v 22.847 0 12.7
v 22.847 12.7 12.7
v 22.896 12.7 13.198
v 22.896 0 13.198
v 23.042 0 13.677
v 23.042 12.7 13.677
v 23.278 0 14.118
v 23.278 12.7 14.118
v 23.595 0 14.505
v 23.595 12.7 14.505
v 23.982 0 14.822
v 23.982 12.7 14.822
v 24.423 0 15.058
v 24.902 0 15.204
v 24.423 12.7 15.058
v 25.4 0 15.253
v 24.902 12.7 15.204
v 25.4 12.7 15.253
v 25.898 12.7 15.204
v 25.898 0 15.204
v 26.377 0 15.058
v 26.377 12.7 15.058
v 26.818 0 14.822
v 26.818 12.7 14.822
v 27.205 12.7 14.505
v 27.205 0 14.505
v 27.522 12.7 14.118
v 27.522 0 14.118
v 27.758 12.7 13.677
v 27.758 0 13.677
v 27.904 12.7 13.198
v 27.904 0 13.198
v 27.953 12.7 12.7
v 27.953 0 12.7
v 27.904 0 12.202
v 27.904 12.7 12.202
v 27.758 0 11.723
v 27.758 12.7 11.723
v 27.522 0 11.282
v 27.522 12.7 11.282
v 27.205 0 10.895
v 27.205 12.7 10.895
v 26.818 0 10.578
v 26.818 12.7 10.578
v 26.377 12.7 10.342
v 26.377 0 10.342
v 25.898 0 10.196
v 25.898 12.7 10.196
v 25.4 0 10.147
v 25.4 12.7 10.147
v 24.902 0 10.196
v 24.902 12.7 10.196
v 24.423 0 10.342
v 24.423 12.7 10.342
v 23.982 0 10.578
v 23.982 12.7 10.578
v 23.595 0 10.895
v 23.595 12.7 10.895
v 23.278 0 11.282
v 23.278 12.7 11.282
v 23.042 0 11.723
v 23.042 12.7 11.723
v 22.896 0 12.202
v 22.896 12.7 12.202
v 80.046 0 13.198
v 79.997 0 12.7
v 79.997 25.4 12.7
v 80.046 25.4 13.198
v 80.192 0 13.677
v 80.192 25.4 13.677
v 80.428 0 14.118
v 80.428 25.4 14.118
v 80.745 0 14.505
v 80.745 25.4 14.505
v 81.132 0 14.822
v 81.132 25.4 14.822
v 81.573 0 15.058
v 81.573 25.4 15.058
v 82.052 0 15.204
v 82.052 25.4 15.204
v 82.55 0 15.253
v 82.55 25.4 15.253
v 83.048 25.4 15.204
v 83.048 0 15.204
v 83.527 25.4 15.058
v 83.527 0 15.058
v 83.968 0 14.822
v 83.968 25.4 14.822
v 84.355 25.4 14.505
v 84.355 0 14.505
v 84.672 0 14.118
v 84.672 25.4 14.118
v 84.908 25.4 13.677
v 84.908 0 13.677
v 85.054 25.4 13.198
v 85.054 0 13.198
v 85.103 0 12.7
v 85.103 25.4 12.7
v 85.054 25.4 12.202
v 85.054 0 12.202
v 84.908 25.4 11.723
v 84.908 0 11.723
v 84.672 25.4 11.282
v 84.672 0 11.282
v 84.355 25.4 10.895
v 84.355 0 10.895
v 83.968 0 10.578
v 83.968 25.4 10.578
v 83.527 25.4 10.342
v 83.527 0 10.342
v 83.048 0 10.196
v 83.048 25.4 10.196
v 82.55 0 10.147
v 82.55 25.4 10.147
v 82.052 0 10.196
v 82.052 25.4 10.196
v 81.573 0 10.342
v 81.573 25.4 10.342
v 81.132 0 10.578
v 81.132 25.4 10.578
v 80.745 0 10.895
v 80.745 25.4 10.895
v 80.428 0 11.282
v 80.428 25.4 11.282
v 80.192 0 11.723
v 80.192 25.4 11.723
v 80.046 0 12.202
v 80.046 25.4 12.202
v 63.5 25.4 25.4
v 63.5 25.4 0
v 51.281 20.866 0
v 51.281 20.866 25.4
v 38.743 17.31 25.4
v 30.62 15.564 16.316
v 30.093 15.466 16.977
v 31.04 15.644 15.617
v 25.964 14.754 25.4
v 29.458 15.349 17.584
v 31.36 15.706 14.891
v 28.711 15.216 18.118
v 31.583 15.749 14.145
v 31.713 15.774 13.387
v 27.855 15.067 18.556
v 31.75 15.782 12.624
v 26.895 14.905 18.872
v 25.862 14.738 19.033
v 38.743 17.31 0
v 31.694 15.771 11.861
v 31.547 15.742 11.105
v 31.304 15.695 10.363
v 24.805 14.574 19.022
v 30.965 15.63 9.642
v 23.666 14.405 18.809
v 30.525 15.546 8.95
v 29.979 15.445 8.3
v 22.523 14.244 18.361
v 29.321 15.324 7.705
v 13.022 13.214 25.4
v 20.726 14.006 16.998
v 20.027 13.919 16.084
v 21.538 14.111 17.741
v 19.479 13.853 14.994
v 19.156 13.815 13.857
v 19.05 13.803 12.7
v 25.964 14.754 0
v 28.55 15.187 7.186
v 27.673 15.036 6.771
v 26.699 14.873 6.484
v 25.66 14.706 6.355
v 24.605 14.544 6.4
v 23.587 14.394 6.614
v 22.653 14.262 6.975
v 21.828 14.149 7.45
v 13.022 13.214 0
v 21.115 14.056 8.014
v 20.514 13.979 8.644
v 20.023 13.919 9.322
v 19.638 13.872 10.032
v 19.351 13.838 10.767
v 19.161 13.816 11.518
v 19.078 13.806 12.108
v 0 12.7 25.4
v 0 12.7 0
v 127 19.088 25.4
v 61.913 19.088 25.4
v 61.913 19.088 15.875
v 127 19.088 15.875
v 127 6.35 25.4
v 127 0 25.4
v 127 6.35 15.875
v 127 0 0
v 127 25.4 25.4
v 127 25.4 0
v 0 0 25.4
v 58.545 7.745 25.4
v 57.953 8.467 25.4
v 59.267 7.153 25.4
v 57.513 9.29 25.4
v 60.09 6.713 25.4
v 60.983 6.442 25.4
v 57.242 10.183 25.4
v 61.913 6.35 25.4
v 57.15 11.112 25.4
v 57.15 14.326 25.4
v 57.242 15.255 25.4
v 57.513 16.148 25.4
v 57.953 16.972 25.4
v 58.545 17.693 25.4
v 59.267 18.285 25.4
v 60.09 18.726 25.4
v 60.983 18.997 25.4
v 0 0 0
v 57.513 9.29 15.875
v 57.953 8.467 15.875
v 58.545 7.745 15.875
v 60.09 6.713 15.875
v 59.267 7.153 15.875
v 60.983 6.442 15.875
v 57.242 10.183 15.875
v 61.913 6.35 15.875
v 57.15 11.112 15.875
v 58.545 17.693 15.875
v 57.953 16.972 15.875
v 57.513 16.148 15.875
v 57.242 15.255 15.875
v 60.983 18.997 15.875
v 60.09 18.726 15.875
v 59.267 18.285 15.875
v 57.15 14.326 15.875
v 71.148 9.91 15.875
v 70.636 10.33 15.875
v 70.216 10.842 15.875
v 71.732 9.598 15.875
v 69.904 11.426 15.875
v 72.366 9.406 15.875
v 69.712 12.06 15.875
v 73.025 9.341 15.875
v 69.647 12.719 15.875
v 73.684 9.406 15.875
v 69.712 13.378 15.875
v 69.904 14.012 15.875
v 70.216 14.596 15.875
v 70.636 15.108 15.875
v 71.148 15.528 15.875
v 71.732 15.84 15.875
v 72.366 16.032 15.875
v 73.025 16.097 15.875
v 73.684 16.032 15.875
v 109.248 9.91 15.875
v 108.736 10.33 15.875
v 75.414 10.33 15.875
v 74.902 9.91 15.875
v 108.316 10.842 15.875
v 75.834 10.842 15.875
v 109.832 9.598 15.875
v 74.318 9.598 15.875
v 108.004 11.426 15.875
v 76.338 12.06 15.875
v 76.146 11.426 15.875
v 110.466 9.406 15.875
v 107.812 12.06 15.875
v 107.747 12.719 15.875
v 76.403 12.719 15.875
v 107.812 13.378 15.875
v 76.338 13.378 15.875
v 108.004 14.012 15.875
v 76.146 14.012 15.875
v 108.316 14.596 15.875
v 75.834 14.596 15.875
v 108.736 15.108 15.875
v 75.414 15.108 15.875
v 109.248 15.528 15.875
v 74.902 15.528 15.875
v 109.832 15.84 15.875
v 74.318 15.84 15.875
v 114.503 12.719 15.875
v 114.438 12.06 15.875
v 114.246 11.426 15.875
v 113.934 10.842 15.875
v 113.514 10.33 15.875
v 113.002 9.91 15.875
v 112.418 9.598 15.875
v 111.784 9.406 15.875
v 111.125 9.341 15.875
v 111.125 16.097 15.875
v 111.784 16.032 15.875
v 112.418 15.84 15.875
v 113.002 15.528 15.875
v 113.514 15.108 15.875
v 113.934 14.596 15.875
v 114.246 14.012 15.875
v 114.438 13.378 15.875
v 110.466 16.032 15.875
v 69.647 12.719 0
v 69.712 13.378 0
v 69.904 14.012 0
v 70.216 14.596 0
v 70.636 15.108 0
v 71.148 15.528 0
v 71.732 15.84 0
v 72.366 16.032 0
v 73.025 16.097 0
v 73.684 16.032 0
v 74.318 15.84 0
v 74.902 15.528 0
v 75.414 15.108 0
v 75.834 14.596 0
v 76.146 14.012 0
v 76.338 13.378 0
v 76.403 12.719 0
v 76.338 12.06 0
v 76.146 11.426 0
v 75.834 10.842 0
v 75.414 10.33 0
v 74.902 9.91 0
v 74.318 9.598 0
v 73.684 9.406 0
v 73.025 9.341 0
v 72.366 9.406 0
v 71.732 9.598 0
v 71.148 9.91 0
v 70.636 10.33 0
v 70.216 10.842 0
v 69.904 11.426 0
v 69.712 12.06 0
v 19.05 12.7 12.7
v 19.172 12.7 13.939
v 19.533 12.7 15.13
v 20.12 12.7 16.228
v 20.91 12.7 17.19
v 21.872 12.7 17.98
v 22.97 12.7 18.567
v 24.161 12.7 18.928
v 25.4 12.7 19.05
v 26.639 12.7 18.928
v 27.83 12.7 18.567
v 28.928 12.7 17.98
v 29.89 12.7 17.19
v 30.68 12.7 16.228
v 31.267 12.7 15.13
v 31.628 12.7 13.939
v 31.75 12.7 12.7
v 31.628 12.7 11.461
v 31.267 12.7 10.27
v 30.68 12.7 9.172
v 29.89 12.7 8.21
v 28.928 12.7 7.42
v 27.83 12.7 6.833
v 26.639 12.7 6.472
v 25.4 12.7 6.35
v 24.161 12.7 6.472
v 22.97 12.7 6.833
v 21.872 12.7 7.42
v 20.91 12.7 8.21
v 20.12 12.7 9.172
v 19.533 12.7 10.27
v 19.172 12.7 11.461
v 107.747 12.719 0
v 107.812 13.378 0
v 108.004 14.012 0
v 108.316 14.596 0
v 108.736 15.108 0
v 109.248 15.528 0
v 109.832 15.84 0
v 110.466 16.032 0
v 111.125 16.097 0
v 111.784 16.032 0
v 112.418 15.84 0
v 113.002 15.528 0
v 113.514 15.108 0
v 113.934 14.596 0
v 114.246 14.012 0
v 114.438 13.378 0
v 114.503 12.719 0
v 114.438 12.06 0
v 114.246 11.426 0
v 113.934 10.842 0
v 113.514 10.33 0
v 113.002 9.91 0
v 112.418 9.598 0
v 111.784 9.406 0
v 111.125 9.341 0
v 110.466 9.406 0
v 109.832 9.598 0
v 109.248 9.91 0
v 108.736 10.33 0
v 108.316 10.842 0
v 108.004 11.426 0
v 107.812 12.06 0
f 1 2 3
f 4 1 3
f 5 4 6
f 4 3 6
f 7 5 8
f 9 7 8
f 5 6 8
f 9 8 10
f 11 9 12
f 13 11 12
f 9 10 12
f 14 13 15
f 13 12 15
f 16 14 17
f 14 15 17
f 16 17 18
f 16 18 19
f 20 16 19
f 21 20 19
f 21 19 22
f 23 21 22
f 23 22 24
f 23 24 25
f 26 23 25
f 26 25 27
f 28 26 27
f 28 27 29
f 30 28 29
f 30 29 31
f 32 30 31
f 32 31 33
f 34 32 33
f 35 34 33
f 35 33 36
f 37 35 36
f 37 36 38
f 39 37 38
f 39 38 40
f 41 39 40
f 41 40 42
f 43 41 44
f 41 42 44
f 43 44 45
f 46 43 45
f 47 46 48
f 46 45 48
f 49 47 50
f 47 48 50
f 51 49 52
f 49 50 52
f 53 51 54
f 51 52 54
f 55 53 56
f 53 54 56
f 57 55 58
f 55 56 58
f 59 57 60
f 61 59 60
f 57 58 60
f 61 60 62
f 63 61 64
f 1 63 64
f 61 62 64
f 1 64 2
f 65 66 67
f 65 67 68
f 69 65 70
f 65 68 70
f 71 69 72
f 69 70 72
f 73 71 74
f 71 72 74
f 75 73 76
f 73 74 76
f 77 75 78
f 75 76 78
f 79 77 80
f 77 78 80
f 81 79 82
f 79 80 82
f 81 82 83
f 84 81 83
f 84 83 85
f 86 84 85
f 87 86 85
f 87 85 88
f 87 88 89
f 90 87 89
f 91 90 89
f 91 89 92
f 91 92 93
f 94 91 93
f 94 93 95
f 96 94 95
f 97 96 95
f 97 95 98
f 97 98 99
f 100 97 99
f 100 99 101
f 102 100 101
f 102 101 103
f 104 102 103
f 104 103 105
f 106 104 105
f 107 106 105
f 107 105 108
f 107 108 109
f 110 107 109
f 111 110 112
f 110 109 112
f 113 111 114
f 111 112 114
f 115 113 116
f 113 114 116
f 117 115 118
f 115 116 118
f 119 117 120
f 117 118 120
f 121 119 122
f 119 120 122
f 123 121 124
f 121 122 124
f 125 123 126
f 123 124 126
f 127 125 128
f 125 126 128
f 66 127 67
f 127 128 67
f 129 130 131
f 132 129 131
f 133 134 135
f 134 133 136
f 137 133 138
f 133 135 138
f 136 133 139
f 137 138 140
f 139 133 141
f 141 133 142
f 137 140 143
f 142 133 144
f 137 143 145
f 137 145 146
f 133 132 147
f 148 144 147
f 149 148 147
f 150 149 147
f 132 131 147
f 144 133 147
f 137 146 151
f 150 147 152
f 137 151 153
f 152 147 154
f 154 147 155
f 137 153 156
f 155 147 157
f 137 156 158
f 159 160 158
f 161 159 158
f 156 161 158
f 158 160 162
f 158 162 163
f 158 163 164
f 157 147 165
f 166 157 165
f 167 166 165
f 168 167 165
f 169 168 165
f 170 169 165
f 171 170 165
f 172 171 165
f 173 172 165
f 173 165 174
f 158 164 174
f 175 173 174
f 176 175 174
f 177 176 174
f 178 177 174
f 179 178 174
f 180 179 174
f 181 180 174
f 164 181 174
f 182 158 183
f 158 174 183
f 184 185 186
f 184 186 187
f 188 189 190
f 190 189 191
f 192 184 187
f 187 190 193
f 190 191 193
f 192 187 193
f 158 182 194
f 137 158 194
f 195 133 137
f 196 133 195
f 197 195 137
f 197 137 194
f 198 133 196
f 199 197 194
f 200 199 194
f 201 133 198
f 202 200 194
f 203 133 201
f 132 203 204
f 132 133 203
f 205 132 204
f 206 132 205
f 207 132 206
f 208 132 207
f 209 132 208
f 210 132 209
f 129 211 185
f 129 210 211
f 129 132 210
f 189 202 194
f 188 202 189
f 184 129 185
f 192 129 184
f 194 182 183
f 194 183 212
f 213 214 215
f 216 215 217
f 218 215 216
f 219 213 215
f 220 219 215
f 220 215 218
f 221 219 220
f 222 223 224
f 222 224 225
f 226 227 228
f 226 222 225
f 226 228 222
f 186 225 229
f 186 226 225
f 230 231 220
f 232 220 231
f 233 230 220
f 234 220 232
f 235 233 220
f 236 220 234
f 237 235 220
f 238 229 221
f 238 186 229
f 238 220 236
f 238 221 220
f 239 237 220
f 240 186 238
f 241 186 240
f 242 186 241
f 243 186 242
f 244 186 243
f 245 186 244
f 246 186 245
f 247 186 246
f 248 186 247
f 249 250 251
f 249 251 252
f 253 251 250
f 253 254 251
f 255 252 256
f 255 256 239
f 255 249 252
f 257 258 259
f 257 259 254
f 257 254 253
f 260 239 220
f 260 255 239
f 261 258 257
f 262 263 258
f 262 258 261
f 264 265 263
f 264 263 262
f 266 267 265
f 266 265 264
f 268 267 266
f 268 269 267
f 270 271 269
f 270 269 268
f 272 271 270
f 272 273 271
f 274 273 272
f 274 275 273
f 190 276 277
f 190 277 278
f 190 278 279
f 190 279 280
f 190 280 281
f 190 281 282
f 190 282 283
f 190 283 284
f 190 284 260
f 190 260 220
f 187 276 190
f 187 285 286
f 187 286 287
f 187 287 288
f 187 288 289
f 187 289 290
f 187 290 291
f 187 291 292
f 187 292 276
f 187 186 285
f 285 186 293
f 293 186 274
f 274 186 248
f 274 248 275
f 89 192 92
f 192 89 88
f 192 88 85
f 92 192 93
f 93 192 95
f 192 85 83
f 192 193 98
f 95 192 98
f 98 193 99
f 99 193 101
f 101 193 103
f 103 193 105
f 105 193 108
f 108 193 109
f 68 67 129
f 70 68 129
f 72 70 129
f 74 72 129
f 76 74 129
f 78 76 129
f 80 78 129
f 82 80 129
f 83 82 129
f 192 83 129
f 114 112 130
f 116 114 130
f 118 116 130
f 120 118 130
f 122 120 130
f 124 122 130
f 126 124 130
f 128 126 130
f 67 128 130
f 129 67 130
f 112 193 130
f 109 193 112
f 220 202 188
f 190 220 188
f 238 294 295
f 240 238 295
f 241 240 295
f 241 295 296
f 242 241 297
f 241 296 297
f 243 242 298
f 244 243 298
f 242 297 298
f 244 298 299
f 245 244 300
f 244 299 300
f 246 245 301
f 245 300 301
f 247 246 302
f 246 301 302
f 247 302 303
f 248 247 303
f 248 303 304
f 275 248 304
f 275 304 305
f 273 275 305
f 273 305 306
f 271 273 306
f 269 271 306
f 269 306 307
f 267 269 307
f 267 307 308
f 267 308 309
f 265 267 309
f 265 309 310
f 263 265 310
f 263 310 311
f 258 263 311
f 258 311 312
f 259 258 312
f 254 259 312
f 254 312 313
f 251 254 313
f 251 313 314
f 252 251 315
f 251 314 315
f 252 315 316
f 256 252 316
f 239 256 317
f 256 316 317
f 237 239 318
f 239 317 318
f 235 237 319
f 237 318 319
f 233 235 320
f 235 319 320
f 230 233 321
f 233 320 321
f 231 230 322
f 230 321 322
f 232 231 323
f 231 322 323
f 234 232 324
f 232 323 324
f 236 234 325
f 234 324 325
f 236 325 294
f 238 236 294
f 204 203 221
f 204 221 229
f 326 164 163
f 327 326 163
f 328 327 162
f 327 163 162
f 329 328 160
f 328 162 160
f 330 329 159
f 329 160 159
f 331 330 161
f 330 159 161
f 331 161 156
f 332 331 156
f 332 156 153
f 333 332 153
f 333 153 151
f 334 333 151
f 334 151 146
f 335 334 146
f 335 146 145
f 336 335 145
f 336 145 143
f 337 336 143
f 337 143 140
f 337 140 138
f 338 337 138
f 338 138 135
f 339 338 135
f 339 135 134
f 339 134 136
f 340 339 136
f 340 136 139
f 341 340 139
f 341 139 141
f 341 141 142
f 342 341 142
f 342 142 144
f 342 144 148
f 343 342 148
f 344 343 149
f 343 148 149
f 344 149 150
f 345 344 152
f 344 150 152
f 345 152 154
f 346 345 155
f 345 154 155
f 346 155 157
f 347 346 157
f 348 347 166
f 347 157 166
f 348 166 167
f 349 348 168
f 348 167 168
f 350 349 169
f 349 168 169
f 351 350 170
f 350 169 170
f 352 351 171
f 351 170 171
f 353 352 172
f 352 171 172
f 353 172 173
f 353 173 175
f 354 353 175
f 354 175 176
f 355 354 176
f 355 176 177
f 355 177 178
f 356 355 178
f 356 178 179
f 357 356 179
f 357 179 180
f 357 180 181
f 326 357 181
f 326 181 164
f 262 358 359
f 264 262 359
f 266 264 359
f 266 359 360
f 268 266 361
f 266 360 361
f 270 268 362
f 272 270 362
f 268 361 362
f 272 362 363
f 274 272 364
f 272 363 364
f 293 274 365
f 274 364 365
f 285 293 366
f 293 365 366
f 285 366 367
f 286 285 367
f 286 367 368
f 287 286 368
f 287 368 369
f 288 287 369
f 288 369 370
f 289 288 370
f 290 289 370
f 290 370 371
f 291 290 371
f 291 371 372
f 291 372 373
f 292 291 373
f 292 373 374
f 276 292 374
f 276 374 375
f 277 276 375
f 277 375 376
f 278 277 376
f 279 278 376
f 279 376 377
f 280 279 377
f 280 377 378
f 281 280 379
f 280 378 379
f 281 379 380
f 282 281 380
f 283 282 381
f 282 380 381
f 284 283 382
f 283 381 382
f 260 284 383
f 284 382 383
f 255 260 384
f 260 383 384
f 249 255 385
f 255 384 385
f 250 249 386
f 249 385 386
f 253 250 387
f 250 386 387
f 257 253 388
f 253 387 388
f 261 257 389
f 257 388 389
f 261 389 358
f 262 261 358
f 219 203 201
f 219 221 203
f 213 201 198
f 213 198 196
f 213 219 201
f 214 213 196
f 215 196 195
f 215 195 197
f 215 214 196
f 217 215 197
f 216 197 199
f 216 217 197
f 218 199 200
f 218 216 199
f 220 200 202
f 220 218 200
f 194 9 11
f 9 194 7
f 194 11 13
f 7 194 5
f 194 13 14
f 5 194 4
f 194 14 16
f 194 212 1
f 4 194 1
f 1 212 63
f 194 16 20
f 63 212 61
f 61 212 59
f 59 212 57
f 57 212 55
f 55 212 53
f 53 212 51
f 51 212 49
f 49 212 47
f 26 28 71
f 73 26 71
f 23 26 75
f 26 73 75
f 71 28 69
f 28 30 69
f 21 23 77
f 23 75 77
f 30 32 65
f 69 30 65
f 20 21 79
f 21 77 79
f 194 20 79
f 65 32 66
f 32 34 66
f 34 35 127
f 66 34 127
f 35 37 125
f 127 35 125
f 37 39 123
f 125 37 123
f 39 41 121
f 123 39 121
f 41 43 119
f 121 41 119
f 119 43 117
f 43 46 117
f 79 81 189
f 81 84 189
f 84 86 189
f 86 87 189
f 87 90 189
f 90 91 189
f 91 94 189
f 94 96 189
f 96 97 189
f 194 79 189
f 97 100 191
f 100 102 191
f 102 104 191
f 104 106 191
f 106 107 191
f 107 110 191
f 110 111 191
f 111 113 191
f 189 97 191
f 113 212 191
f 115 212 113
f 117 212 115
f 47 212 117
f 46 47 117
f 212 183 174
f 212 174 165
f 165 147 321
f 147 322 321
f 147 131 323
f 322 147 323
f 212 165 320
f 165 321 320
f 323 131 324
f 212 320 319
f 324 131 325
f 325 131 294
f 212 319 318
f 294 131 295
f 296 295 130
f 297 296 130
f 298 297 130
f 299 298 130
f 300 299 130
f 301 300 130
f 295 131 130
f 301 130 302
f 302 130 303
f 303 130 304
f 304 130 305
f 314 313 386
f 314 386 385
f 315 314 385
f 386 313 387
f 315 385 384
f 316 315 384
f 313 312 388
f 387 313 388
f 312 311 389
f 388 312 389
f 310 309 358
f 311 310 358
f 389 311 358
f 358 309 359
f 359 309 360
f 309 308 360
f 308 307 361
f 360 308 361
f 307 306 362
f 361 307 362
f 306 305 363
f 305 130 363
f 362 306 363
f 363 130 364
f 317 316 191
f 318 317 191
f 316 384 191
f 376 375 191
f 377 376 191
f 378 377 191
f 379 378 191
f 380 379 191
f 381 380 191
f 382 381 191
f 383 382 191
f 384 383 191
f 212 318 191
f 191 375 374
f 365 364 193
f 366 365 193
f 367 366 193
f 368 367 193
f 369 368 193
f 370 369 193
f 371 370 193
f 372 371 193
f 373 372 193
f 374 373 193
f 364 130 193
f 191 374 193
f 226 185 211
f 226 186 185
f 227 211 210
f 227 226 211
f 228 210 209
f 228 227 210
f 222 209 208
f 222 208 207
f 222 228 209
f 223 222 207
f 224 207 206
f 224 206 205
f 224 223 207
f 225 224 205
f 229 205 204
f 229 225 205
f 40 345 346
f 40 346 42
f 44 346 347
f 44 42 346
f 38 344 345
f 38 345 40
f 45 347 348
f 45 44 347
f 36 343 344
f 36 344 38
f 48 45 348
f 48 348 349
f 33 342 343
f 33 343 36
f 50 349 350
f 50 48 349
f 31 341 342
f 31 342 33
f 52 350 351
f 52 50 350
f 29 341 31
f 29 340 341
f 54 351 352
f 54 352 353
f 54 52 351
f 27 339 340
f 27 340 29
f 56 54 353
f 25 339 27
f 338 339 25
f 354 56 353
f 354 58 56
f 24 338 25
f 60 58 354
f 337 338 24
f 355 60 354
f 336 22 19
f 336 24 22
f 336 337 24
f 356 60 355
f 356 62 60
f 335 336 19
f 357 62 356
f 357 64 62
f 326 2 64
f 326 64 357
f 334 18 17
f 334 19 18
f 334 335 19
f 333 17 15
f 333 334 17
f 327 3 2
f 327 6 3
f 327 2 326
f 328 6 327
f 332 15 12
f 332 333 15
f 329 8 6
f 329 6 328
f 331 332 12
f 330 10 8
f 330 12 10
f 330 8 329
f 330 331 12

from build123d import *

# Parameters (mm, degrees)
F1_DEPTH = 25.4
F3_D     = 5.1054
F4_R     = 6.35
F5_DEPTH = 12.7
F6_W     = 69.85
F6_H     = 12.7381
F7_DEPTH = 9.525
F9_D     = 6.7564
F10_R    = 4.7625


with BuildPart() as f1:
    # F0 (on Top) → F1 (new body)
    with BuildSketch(Plane.XY):
        with BuildLine():
            Line((0, 12.7), (0, 0))
            Line((0, 0), (127, 0))
            Line((127, 0), (127, 25.4))
            Line((127, 25.4), (63.5, 25.4))
            ThreePointArc((63.5, 25.4), (32.3787739113, 15.9061304434), (0, 12.7))
        make_face()
    extrude(amount=F1_DEPTH)

    # F3 (through all)
    with Locations(Plane.XZ):
        with Locations((25.4, 12.7), (82.55, 12.7)):
            Hole(F3_D / 2)

    # F4 (on face) → F5 (cut)
    with BuildSketch(Plane(origin=(0, 25.4, 0), x_dir=(-1, 0, 0), z_dir=(0, 1, 0))):
        with Locations((-25.4, 12.7)):
            Circle(F4_R)
    extrude(amount=-F5_DEPTH, mode=Mode.SUBTRACT)

    # F6 (on face) → F7 (cut)
    with BuildSketch(Plane.XY.offset(25.4)):
        with Locations((92.075, 12.71905)):
            Rectangle(F6_W, F6_H)
    extrude(amount=-F7_DEPTH, mode=Mode.SUBTRACT)

    # F9 (through all)
    with Locations(Plane.XY.offset(25.4)):
        with Locations((73.025, 12.71905), (111.125, 12.71905)):
            Hole(F9_D / 2)

    # F10
    f10_edges = [f1.edges().sort_by_distance(p)[0] for p in [
        (57.15, 19.0881, 20.6375),
        (57.15, 6.35, 20.6375),
    ]]
    fillet(f10_edges, radius=F10_R)


solid = f1.part
